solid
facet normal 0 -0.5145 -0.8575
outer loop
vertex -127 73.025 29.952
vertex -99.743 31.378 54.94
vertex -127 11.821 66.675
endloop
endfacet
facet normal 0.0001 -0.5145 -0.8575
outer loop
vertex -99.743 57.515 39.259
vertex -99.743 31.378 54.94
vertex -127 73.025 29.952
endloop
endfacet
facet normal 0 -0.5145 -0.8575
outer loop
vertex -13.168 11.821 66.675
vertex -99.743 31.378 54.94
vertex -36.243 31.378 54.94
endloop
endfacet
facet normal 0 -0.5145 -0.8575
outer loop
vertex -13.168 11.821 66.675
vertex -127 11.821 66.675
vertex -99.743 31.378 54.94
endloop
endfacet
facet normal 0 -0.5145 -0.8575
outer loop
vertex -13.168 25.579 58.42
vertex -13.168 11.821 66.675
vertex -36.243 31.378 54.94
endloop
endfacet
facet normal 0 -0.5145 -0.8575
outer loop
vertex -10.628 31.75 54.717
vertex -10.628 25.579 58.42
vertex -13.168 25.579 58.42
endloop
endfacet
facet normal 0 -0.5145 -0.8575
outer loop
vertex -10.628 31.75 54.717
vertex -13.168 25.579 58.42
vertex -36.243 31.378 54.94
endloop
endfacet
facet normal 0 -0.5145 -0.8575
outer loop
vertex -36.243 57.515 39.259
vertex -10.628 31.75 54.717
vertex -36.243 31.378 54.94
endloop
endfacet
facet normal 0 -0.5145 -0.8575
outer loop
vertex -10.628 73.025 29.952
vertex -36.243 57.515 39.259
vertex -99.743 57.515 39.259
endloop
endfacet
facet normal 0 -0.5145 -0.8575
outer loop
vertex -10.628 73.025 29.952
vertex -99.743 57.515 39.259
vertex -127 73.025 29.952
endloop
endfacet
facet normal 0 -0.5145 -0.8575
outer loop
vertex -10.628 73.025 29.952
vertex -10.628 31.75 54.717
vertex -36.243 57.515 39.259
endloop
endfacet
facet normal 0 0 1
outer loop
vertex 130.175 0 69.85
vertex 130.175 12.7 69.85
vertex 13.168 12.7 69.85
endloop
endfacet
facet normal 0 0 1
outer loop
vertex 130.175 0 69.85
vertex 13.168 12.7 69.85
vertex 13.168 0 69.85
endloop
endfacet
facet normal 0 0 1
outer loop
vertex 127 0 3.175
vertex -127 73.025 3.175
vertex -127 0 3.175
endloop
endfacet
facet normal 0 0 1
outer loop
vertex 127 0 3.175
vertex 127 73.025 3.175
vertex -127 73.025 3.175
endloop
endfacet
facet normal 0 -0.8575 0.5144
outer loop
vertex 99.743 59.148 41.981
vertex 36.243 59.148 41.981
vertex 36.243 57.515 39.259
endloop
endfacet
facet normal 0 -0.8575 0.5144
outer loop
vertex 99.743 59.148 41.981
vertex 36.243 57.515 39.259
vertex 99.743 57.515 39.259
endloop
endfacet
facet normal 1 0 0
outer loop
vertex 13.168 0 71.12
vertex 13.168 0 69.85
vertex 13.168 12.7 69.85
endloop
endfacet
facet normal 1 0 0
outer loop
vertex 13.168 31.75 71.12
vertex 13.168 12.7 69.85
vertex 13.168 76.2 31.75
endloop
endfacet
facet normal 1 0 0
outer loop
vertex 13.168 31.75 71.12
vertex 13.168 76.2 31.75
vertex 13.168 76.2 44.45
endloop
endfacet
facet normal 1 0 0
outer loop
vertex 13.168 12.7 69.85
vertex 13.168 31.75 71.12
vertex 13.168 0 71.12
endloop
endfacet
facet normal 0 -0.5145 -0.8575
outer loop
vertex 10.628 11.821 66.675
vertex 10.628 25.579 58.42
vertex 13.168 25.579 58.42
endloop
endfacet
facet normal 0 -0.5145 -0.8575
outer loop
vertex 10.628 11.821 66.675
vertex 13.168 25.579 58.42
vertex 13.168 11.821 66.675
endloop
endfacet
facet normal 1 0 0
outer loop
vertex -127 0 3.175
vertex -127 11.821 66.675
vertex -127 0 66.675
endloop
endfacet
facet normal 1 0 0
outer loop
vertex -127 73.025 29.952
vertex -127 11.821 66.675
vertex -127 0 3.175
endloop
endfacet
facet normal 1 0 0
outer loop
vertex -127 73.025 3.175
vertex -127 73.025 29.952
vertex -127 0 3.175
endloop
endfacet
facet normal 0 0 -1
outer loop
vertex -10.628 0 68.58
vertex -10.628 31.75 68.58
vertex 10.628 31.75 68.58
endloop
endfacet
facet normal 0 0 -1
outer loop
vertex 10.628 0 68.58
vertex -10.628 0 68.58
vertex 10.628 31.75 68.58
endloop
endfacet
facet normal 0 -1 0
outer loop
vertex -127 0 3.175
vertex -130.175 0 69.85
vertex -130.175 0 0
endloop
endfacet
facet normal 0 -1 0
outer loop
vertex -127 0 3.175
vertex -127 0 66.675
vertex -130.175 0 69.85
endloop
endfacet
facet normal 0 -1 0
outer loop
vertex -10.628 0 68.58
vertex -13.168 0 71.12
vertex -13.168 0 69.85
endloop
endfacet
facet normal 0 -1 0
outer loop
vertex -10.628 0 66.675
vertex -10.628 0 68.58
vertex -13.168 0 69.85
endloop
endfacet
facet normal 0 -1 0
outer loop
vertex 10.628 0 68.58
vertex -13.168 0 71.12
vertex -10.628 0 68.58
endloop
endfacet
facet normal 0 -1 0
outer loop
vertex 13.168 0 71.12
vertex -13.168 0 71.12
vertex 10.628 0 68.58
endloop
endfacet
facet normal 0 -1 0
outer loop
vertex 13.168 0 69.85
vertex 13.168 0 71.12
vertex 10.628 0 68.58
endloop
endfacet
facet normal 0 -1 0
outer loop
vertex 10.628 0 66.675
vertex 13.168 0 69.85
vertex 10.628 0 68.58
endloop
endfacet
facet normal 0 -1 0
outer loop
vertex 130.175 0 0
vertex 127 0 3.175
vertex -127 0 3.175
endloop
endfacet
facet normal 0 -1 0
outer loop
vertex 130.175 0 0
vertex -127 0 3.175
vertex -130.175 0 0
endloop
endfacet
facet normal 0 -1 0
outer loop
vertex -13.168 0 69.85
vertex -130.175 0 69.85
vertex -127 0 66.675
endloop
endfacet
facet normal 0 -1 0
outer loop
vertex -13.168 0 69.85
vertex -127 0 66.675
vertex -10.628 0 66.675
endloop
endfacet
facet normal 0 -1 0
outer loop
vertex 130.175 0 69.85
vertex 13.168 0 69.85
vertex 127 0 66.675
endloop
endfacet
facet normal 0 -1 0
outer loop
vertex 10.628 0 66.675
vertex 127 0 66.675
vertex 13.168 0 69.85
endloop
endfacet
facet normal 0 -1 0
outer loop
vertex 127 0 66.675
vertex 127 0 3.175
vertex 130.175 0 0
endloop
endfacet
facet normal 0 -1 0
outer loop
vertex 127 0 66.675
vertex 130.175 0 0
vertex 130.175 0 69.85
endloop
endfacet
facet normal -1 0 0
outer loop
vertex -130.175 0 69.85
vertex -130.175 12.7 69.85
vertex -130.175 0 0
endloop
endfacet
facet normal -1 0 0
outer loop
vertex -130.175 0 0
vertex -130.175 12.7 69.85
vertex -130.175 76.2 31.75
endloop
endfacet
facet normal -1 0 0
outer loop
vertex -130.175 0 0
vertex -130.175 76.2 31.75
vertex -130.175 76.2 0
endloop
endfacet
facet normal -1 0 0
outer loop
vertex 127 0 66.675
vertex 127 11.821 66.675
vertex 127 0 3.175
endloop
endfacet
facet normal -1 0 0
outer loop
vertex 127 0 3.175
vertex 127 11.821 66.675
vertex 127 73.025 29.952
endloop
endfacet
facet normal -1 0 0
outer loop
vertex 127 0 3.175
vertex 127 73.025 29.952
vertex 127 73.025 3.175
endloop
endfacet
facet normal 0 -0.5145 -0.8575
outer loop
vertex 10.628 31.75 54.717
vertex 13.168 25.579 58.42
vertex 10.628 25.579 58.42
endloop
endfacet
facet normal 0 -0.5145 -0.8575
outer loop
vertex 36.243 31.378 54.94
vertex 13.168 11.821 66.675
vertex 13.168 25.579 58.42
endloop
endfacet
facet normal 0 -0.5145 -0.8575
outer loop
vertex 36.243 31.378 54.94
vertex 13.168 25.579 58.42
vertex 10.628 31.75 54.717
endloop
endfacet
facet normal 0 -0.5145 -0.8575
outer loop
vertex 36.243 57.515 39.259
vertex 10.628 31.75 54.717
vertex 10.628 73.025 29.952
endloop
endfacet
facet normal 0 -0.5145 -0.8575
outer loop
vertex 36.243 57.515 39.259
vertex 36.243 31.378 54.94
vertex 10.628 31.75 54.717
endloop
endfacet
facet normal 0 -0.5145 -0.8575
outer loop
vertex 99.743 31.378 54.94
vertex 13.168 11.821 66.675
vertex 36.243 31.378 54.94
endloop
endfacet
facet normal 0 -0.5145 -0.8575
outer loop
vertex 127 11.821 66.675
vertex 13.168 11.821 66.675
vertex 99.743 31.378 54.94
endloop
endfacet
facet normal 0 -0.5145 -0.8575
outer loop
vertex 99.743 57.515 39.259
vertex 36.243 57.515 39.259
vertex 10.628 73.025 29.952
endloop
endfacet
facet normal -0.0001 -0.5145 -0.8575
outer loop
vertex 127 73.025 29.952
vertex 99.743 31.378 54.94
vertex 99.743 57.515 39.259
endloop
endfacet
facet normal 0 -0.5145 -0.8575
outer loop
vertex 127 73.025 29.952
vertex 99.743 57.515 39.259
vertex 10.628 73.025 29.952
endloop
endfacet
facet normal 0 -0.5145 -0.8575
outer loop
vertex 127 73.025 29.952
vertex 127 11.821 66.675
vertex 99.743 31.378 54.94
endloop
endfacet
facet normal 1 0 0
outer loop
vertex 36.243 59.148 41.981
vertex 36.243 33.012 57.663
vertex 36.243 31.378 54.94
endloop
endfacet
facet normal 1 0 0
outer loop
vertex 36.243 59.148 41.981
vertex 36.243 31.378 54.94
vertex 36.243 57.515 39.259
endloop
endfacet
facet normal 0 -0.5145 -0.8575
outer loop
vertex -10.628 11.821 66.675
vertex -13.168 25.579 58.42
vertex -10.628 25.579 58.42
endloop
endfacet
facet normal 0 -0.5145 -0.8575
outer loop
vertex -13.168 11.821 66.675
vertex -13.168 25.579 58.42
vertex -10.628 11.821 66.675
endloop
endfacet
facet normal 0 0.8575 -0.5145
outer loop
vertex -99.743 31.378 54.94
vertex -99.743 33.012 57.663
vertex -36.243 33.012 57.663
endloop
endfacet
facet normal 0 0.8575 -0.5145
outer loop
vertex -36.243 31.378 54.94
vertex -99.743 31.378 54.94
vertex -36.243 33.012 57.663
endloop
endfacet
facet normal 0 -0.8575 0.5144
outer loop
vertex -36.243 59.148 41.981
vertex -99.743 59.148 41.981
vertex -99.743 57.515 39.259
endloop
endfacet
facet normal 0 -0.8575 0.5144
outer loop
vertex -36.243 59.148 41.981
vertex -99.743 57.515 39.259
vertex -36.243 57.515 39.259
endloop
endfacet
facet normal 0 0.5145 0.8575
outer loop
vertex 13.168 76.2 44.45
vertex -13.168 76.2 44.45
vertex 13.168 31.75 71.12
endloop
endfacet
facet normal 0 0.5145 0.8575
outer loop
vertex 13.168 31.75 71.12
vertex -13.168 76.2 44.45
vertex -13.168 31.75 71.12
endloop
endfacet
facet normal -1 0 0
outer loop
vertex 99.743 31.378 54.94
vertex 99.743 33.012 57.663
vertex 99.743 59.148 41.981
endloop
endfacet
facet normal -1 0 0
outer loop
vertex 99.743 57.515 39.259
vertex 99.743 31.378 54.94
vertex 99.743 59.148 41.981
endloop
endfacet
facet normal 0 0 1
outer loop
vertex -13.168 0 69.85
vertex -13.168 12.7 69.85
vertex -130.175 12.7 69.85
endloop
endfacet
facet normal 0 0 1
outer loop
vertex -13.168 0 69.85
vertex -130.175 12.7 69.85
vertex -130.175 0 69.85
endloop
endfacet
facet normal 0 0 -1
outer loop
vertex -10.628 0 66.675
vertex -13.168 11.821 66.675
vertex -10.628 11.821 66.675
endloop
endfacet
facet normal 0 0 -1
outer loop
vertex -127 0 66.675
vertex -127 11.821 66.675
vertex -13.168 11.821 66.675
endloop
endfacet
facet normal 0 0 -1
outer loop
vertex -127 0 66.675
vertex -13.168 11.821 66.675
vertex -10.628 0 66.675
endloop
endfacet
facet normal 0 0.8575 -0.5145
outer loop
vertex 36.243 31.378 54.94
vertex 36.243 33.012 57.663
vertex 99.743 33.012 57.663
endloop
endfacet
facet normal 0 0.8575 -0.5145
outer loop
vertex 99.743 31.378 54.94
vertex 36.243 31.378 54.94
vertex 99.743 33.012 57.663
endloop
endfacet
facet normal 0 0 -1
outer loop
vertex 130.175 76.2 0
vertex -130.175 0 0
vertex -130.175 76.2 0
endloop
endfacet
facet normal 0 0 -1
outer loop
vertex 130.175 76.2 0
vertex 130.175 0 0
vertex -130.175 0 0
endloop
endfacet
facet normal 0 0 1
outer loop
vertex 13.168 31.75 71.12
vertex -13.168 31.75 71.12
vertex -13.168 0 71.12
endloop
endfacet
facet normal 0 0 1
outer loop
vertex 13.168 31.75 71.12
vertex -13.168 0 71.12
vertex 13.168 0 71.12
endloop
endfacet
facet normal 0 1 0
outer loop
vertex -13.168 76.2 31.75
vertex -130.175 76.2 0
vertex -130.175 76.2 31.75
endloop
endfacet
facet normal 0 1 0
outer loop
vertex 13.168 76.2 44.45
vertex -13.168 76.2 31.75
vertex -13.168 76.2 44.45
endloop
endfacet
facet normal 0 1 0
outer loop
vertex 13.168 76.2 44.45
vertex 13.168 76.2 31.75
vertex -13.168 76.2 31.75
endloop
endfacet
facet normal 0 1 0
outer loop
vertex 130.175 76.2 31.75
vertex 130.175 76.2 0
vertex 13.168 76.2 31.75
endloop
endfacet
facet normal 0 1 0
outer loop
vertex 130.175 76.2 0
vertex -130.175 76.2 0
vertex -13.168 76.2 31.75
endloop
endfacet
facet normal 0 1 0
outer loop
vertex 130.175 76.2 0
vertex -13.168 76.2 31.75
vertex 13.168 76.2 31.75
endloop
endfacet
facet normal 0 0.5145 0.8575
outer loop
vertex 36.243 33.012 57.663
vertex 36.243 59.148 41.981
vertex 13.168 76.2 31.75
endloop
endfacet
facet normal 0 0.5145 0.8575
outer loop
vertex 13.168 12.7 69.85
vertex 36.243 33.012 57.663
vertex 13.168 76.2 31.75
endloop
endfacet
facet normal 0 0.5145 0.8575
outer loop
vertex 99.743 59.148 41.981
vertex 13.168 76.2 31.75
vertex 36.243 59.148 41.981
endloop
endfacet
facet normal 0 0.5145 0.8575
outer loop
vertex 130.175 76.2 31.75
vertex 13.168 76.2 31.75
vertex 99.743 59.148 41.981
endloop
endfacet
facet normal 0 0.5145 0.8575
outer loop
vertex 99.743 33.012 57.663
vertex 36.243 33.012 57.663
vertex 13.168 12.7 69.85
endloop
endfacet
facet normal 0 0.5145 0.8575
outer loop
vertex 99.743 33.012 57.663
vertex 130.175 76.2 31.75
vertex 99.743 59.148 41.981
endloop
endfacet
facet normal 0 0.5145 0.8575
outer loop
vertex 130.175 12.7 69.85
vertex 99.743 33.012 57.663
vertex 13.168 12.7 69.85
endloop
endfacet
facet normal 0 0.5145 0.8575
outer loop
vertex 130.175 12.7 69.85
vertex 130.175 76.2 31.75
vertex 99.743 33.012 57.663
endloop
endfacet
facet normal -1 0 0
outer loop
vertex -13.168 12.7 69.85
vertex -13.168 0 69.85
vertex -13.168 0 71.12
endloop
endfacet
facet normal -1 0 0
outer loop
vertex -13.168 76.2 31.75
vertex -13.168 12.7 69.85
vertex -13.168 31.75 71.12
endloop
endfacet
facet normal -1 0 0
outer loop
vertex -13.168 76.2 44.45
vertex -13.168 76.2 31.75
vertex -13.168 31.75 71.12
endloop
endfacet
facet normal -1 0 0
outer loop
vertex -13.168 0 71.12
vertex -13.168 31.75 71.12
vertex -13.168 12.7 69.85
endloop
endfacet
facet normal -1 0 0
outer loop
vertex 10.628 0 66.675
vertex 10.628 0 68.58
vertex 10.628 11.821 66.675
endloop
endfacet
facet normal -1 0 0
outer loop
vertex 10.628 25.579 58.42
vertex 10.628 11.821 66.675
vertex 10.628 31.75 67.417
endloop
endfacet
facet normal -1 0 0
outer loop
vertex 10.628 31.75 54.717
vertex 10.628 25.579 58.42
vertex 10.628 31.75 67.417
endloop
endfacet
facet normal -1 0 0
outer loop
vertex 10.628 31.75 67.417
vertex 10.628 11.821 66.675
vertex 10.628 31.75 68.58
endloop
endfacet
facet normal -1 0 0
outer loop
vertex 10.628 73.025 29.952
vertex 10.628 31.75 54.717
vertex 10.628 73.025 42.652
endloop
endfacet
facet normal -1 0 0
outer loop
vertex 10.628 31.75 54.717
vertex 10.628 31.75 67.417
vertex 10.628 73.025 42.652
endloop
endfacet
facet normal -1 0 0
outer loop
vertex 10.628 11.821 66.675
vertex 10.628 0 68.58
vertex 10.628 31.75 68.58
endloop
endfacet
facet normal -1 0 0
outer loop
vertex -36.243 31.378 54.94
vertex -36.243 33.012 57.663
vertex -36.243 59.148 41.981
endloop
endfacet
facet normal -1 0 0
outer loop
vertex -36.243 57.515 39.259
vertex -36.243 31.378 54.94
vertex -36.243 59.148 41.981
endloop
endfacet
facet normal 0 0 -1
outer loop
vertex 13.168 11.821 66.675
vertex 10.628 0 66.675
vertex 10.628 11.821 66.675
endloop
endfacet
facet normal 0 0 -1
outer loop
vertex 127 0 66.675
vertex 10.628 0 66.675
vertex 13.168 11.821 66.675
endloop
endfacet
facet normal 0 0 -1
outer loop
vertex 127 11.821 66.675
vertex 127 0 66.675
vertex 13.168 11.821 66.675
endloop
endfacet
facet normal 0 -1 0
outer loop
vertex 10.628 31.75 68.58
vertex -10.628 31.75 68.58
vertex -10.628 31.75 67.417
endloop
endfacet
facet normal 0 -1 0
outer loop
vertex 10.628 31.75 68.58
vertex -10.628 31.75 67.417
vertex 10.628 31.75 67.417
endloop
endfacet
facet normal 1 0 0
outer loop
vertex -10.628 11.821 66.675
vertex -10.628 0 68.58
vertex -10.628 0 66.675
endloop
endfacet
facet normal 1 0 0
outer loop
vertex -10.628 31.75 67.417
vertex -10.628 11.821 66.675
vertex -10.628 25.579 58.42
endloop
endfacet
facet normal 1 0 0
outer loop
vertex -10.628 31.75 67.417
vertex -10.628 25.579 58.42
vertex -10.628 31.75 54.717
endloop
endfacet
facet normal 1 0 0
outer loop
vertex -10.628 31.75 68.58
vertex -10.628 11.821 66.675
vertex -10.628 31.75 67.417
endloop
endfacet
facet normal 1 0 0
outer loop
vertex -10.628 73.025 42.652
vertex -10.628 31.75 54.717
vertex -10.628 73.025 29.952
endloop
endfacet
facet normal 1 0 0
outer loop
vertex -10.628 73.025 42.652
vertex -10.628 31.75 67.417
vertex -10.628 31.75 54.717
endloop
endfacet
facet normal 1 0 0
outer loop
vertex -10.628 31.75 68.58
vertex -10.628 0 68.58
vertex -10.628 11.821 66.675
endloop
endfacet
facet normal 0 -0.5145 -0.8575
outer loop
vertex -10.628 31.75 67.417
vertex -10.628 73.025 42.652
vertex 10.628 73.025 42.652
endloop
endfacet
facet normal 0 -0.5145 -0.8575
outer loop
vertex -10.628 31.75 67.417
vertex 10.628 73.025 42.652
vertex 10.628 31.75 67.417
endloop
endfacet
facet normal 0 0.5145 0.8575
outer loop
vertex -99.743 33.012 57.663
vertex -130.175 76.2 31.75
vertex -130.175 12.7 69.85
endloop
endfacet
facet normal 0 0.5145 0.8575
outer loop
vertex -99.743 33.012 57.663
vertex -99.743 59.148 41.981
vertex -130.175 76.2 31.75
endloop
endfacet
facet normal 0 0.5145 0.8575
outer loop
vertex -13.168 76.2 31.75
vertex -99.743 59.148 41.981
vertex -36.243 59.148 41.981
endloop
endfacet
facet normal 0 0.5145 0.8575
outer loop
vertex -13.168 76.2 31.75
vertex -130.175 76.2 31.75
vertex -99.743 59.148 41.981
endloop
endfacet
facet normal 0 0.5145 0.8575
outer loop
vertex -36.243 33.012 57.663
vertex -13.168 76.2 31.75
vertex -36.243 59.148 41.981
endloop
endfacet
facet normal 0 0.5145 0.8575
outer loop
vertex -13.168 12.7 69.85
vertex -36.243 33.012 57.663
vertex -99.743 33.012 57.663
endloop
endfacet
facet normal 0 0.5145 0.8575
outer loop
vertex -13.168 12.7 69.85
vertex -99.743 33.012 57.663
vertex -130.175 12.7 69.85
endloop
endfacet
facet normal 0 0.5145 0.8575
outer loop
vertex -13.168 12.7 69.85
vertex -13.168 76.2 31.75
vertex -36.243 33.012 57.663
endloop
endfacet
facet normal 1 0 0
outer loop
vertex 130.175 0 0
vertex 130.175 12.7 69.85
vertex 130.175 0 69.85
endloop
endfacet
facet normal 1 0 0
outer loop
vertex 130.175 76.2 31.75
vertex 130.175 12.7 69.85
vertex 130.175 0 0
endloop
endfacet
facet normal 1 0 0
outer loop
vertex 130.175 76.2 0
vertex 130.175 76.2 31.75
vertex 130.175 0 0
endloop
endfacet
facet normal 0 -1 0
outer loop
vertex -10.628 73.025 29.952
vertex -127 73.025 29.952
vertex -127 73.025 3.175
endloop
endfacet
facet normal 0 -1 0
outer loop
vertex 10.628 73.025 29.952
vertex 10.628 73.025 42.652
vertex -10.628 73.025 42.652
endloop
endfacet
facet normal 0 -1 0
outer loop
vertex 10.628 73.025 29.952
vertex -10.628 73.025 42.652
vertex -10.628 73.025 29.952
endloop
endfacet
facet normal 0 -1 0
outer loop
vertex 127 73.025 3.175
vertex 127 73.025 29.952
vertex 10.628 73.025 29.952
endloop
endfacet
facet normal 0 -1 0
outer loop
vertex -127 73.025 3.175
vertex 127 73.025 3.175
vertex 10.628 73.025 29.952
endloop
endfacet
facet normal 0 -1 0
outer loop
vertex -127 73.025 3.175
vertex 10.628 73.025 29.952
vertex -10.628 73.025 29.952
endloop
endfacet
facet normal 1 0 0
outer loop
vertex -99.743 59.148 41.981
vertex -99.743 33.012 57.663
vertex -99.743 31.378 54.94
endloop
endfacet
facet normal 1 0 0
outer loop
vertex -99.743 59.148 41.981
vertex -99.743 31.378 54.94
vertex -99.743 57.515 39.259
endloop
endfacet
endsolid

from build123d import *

# Parameters (mm, degrees)
BOSS_EXTRUDE1_DEPTH = 127
BOSS_EXTRUDE2_DEPTH = 3.175
SKETCH3_W           = 63.5
SKETCH3_H           = 30.48
CUT_EXTRUDE1_DEPTH  = 3.175
BOSS_EXTRUDE3_START = -13.167941481
BOSS_EXTRUDE3_DEPTH = 26.335882962
SKETCH10_W          = 26.335882962
SKETCH10_H          = 12.7
BOSS_EXTRUDE5_DEPTH = 31.75
CUT_EXTRUDE7_START  = -10.627941481
CUT_EXTRUDE7_DEPTH  = 21.255882962
CUT_EXTRUDE8_START  = -2.54
SKETCH12_W          = 21.255882962
SKETCH12_H          = 31.75
CUT_EXTRUDE8_DEPTH  = 15.24
CUT_EXTRUDE9_START  = -26.335883
CUT_EXTRUDE9_DEPTH  = 26.335883


# Read off the part's stored shape, not the designer's step: Boss-Extrude3, Cut-Extrude7
with BuildPart() as part:
    # Sketch1 → Boss-Extrude1 (new, symmetric)
    with BuildSketch(Plane(origin=(0, 0, 0), x_dir=(0, 0, -1), z_dir=(1, 0, 0))):
        Polygon((-3.175, 0), (0, 0), (0, 76.2), (-31.75, 76.2), (-69.85, 12.7), (-69.85, 0), (-66.675, 0), (-66.675, 11.820575911), (-29.952345547, 73.025), (-3.175, 73.025), align=None)
    extrude(amount=BOSS_EXTRUDE1_DEPTH, both=True)

    # Sketch2 → Boss-Extrude2 (add)
    with BuildSketch(Plane(origin=(127, 0, 0), x_dir=(0, 0, -1), z_dir=(1, 0, 0))):
        Polygon((-66.675, 0), (-3.175, 0), (-3.175, 73.025), (-29.952345547, 73.025), (-66.675, 11.820575911), align=None)
        Polygon((-66.675, 11.820575911), (-29.952345547, 73.025), (-3.175, 73.025), (-3.175, 0), (0, 0), (0, 76.2), (-31.75, 76.2), (-69.85, 12.7), (-69.85, 0), (-66.675, 0), align=None)
    boss_extrude2 = extrude(amount=BOSS_EXTRUDE2_DEPTH)

    # Mirror1: Boss-Extrude2 across plane
    add(boss_extrude2.mirror(Plane(origin=(0, 0, 0), x_dir=(0, 0, 1), z_dir=(1, 0, 0))))

    # Sketch3 → Cut-Extrude1 (cut)
    with BuildSketch(Plane(origin=(0, 34.177941176, 56.963235294), x_dir=(1, 0, 0), z_dir=(0, 0.5144957554275267, 0.8574929257125442))):
        with Locations((-67.993455951, 13.879941606)):
            Rectangle(SKETCH3_W, SKETCH3_H)
        with Locations((67.993455951, 13.879941606)):
            Rectangle(SKETCH3_W, SKETCH3_H)
    extrude(amount=-CUT_EXTRUDE1_DEPTH, mode=Mode.SUBTRACT)

    # Boss-Extrude3 outline → Boss-Extrude3 (add)
    with BuildSketch(Plane.YZ.offset(BOSS_EXTRUDE3_START)):
        Polygon((76.2, 31.75), (76.2, 44.45), (31.75, 71.12), (31.75, 58.42), align=None)
    extrude(amount=BOSS_EXTRUDE3_DEPTH)

    # Sketch10 → Boss-Extrude5 (add)
    with BuildSketch(Plane.XZ.offset(-31.75)):
        with Locations((0, 64.77)):
            Rectangle(SKETCH10_W, SKETCH10_H)
    extrude(amount=BOSS_EXTRUDE5_DEPTH)

    # Cut-Extrude7 outline → Cut-Extrude7 (cut)
    with BuildSketch(Plane.YZ.offset(CUT_EXTRUDE7_START)):
        Polygon((31.75, 54.717345547), (73.025, 29.952345547), (73.025, 42.652345547), (31.75, 67.417345547), align=None)
    extrude(amount=CUT_EXTRUDE7_DEPTH, mode=Mode.SUBTRACT)

    # Sketch12 → Cut-Extrude8 (cut)
    with BuildSketch(Plane.XY.offset(71.12).offset(CUT_EXTRUDE8_START)):
        with Locations((0, 15.875)):
            Rectangle(SKETCH12_W, SKETCH12_H)
    extrude(amount=-CUT_EXTRUDE8_DEPTH, mode=Mode.SUBTRACT)

    # Sketch13 → Cut-Extrude9 (cut)
    with BuildSketch(Plane(origin=(13.167941481, 0, 0), x_dir=(0, 0, -1), z_dir=(1, 0, 0)).offset(CUT_EXTRUDE9_START)):
        Polygon((-58.42, 25.578909245), (-66.675, 11.820575911), (-66.675, 0), (-58.42, 0), align=None)
    extrude(amount=CUT_EXTRUDE9_DEPTH, mode=Mode.SUBTRACT)


solid = part.part
